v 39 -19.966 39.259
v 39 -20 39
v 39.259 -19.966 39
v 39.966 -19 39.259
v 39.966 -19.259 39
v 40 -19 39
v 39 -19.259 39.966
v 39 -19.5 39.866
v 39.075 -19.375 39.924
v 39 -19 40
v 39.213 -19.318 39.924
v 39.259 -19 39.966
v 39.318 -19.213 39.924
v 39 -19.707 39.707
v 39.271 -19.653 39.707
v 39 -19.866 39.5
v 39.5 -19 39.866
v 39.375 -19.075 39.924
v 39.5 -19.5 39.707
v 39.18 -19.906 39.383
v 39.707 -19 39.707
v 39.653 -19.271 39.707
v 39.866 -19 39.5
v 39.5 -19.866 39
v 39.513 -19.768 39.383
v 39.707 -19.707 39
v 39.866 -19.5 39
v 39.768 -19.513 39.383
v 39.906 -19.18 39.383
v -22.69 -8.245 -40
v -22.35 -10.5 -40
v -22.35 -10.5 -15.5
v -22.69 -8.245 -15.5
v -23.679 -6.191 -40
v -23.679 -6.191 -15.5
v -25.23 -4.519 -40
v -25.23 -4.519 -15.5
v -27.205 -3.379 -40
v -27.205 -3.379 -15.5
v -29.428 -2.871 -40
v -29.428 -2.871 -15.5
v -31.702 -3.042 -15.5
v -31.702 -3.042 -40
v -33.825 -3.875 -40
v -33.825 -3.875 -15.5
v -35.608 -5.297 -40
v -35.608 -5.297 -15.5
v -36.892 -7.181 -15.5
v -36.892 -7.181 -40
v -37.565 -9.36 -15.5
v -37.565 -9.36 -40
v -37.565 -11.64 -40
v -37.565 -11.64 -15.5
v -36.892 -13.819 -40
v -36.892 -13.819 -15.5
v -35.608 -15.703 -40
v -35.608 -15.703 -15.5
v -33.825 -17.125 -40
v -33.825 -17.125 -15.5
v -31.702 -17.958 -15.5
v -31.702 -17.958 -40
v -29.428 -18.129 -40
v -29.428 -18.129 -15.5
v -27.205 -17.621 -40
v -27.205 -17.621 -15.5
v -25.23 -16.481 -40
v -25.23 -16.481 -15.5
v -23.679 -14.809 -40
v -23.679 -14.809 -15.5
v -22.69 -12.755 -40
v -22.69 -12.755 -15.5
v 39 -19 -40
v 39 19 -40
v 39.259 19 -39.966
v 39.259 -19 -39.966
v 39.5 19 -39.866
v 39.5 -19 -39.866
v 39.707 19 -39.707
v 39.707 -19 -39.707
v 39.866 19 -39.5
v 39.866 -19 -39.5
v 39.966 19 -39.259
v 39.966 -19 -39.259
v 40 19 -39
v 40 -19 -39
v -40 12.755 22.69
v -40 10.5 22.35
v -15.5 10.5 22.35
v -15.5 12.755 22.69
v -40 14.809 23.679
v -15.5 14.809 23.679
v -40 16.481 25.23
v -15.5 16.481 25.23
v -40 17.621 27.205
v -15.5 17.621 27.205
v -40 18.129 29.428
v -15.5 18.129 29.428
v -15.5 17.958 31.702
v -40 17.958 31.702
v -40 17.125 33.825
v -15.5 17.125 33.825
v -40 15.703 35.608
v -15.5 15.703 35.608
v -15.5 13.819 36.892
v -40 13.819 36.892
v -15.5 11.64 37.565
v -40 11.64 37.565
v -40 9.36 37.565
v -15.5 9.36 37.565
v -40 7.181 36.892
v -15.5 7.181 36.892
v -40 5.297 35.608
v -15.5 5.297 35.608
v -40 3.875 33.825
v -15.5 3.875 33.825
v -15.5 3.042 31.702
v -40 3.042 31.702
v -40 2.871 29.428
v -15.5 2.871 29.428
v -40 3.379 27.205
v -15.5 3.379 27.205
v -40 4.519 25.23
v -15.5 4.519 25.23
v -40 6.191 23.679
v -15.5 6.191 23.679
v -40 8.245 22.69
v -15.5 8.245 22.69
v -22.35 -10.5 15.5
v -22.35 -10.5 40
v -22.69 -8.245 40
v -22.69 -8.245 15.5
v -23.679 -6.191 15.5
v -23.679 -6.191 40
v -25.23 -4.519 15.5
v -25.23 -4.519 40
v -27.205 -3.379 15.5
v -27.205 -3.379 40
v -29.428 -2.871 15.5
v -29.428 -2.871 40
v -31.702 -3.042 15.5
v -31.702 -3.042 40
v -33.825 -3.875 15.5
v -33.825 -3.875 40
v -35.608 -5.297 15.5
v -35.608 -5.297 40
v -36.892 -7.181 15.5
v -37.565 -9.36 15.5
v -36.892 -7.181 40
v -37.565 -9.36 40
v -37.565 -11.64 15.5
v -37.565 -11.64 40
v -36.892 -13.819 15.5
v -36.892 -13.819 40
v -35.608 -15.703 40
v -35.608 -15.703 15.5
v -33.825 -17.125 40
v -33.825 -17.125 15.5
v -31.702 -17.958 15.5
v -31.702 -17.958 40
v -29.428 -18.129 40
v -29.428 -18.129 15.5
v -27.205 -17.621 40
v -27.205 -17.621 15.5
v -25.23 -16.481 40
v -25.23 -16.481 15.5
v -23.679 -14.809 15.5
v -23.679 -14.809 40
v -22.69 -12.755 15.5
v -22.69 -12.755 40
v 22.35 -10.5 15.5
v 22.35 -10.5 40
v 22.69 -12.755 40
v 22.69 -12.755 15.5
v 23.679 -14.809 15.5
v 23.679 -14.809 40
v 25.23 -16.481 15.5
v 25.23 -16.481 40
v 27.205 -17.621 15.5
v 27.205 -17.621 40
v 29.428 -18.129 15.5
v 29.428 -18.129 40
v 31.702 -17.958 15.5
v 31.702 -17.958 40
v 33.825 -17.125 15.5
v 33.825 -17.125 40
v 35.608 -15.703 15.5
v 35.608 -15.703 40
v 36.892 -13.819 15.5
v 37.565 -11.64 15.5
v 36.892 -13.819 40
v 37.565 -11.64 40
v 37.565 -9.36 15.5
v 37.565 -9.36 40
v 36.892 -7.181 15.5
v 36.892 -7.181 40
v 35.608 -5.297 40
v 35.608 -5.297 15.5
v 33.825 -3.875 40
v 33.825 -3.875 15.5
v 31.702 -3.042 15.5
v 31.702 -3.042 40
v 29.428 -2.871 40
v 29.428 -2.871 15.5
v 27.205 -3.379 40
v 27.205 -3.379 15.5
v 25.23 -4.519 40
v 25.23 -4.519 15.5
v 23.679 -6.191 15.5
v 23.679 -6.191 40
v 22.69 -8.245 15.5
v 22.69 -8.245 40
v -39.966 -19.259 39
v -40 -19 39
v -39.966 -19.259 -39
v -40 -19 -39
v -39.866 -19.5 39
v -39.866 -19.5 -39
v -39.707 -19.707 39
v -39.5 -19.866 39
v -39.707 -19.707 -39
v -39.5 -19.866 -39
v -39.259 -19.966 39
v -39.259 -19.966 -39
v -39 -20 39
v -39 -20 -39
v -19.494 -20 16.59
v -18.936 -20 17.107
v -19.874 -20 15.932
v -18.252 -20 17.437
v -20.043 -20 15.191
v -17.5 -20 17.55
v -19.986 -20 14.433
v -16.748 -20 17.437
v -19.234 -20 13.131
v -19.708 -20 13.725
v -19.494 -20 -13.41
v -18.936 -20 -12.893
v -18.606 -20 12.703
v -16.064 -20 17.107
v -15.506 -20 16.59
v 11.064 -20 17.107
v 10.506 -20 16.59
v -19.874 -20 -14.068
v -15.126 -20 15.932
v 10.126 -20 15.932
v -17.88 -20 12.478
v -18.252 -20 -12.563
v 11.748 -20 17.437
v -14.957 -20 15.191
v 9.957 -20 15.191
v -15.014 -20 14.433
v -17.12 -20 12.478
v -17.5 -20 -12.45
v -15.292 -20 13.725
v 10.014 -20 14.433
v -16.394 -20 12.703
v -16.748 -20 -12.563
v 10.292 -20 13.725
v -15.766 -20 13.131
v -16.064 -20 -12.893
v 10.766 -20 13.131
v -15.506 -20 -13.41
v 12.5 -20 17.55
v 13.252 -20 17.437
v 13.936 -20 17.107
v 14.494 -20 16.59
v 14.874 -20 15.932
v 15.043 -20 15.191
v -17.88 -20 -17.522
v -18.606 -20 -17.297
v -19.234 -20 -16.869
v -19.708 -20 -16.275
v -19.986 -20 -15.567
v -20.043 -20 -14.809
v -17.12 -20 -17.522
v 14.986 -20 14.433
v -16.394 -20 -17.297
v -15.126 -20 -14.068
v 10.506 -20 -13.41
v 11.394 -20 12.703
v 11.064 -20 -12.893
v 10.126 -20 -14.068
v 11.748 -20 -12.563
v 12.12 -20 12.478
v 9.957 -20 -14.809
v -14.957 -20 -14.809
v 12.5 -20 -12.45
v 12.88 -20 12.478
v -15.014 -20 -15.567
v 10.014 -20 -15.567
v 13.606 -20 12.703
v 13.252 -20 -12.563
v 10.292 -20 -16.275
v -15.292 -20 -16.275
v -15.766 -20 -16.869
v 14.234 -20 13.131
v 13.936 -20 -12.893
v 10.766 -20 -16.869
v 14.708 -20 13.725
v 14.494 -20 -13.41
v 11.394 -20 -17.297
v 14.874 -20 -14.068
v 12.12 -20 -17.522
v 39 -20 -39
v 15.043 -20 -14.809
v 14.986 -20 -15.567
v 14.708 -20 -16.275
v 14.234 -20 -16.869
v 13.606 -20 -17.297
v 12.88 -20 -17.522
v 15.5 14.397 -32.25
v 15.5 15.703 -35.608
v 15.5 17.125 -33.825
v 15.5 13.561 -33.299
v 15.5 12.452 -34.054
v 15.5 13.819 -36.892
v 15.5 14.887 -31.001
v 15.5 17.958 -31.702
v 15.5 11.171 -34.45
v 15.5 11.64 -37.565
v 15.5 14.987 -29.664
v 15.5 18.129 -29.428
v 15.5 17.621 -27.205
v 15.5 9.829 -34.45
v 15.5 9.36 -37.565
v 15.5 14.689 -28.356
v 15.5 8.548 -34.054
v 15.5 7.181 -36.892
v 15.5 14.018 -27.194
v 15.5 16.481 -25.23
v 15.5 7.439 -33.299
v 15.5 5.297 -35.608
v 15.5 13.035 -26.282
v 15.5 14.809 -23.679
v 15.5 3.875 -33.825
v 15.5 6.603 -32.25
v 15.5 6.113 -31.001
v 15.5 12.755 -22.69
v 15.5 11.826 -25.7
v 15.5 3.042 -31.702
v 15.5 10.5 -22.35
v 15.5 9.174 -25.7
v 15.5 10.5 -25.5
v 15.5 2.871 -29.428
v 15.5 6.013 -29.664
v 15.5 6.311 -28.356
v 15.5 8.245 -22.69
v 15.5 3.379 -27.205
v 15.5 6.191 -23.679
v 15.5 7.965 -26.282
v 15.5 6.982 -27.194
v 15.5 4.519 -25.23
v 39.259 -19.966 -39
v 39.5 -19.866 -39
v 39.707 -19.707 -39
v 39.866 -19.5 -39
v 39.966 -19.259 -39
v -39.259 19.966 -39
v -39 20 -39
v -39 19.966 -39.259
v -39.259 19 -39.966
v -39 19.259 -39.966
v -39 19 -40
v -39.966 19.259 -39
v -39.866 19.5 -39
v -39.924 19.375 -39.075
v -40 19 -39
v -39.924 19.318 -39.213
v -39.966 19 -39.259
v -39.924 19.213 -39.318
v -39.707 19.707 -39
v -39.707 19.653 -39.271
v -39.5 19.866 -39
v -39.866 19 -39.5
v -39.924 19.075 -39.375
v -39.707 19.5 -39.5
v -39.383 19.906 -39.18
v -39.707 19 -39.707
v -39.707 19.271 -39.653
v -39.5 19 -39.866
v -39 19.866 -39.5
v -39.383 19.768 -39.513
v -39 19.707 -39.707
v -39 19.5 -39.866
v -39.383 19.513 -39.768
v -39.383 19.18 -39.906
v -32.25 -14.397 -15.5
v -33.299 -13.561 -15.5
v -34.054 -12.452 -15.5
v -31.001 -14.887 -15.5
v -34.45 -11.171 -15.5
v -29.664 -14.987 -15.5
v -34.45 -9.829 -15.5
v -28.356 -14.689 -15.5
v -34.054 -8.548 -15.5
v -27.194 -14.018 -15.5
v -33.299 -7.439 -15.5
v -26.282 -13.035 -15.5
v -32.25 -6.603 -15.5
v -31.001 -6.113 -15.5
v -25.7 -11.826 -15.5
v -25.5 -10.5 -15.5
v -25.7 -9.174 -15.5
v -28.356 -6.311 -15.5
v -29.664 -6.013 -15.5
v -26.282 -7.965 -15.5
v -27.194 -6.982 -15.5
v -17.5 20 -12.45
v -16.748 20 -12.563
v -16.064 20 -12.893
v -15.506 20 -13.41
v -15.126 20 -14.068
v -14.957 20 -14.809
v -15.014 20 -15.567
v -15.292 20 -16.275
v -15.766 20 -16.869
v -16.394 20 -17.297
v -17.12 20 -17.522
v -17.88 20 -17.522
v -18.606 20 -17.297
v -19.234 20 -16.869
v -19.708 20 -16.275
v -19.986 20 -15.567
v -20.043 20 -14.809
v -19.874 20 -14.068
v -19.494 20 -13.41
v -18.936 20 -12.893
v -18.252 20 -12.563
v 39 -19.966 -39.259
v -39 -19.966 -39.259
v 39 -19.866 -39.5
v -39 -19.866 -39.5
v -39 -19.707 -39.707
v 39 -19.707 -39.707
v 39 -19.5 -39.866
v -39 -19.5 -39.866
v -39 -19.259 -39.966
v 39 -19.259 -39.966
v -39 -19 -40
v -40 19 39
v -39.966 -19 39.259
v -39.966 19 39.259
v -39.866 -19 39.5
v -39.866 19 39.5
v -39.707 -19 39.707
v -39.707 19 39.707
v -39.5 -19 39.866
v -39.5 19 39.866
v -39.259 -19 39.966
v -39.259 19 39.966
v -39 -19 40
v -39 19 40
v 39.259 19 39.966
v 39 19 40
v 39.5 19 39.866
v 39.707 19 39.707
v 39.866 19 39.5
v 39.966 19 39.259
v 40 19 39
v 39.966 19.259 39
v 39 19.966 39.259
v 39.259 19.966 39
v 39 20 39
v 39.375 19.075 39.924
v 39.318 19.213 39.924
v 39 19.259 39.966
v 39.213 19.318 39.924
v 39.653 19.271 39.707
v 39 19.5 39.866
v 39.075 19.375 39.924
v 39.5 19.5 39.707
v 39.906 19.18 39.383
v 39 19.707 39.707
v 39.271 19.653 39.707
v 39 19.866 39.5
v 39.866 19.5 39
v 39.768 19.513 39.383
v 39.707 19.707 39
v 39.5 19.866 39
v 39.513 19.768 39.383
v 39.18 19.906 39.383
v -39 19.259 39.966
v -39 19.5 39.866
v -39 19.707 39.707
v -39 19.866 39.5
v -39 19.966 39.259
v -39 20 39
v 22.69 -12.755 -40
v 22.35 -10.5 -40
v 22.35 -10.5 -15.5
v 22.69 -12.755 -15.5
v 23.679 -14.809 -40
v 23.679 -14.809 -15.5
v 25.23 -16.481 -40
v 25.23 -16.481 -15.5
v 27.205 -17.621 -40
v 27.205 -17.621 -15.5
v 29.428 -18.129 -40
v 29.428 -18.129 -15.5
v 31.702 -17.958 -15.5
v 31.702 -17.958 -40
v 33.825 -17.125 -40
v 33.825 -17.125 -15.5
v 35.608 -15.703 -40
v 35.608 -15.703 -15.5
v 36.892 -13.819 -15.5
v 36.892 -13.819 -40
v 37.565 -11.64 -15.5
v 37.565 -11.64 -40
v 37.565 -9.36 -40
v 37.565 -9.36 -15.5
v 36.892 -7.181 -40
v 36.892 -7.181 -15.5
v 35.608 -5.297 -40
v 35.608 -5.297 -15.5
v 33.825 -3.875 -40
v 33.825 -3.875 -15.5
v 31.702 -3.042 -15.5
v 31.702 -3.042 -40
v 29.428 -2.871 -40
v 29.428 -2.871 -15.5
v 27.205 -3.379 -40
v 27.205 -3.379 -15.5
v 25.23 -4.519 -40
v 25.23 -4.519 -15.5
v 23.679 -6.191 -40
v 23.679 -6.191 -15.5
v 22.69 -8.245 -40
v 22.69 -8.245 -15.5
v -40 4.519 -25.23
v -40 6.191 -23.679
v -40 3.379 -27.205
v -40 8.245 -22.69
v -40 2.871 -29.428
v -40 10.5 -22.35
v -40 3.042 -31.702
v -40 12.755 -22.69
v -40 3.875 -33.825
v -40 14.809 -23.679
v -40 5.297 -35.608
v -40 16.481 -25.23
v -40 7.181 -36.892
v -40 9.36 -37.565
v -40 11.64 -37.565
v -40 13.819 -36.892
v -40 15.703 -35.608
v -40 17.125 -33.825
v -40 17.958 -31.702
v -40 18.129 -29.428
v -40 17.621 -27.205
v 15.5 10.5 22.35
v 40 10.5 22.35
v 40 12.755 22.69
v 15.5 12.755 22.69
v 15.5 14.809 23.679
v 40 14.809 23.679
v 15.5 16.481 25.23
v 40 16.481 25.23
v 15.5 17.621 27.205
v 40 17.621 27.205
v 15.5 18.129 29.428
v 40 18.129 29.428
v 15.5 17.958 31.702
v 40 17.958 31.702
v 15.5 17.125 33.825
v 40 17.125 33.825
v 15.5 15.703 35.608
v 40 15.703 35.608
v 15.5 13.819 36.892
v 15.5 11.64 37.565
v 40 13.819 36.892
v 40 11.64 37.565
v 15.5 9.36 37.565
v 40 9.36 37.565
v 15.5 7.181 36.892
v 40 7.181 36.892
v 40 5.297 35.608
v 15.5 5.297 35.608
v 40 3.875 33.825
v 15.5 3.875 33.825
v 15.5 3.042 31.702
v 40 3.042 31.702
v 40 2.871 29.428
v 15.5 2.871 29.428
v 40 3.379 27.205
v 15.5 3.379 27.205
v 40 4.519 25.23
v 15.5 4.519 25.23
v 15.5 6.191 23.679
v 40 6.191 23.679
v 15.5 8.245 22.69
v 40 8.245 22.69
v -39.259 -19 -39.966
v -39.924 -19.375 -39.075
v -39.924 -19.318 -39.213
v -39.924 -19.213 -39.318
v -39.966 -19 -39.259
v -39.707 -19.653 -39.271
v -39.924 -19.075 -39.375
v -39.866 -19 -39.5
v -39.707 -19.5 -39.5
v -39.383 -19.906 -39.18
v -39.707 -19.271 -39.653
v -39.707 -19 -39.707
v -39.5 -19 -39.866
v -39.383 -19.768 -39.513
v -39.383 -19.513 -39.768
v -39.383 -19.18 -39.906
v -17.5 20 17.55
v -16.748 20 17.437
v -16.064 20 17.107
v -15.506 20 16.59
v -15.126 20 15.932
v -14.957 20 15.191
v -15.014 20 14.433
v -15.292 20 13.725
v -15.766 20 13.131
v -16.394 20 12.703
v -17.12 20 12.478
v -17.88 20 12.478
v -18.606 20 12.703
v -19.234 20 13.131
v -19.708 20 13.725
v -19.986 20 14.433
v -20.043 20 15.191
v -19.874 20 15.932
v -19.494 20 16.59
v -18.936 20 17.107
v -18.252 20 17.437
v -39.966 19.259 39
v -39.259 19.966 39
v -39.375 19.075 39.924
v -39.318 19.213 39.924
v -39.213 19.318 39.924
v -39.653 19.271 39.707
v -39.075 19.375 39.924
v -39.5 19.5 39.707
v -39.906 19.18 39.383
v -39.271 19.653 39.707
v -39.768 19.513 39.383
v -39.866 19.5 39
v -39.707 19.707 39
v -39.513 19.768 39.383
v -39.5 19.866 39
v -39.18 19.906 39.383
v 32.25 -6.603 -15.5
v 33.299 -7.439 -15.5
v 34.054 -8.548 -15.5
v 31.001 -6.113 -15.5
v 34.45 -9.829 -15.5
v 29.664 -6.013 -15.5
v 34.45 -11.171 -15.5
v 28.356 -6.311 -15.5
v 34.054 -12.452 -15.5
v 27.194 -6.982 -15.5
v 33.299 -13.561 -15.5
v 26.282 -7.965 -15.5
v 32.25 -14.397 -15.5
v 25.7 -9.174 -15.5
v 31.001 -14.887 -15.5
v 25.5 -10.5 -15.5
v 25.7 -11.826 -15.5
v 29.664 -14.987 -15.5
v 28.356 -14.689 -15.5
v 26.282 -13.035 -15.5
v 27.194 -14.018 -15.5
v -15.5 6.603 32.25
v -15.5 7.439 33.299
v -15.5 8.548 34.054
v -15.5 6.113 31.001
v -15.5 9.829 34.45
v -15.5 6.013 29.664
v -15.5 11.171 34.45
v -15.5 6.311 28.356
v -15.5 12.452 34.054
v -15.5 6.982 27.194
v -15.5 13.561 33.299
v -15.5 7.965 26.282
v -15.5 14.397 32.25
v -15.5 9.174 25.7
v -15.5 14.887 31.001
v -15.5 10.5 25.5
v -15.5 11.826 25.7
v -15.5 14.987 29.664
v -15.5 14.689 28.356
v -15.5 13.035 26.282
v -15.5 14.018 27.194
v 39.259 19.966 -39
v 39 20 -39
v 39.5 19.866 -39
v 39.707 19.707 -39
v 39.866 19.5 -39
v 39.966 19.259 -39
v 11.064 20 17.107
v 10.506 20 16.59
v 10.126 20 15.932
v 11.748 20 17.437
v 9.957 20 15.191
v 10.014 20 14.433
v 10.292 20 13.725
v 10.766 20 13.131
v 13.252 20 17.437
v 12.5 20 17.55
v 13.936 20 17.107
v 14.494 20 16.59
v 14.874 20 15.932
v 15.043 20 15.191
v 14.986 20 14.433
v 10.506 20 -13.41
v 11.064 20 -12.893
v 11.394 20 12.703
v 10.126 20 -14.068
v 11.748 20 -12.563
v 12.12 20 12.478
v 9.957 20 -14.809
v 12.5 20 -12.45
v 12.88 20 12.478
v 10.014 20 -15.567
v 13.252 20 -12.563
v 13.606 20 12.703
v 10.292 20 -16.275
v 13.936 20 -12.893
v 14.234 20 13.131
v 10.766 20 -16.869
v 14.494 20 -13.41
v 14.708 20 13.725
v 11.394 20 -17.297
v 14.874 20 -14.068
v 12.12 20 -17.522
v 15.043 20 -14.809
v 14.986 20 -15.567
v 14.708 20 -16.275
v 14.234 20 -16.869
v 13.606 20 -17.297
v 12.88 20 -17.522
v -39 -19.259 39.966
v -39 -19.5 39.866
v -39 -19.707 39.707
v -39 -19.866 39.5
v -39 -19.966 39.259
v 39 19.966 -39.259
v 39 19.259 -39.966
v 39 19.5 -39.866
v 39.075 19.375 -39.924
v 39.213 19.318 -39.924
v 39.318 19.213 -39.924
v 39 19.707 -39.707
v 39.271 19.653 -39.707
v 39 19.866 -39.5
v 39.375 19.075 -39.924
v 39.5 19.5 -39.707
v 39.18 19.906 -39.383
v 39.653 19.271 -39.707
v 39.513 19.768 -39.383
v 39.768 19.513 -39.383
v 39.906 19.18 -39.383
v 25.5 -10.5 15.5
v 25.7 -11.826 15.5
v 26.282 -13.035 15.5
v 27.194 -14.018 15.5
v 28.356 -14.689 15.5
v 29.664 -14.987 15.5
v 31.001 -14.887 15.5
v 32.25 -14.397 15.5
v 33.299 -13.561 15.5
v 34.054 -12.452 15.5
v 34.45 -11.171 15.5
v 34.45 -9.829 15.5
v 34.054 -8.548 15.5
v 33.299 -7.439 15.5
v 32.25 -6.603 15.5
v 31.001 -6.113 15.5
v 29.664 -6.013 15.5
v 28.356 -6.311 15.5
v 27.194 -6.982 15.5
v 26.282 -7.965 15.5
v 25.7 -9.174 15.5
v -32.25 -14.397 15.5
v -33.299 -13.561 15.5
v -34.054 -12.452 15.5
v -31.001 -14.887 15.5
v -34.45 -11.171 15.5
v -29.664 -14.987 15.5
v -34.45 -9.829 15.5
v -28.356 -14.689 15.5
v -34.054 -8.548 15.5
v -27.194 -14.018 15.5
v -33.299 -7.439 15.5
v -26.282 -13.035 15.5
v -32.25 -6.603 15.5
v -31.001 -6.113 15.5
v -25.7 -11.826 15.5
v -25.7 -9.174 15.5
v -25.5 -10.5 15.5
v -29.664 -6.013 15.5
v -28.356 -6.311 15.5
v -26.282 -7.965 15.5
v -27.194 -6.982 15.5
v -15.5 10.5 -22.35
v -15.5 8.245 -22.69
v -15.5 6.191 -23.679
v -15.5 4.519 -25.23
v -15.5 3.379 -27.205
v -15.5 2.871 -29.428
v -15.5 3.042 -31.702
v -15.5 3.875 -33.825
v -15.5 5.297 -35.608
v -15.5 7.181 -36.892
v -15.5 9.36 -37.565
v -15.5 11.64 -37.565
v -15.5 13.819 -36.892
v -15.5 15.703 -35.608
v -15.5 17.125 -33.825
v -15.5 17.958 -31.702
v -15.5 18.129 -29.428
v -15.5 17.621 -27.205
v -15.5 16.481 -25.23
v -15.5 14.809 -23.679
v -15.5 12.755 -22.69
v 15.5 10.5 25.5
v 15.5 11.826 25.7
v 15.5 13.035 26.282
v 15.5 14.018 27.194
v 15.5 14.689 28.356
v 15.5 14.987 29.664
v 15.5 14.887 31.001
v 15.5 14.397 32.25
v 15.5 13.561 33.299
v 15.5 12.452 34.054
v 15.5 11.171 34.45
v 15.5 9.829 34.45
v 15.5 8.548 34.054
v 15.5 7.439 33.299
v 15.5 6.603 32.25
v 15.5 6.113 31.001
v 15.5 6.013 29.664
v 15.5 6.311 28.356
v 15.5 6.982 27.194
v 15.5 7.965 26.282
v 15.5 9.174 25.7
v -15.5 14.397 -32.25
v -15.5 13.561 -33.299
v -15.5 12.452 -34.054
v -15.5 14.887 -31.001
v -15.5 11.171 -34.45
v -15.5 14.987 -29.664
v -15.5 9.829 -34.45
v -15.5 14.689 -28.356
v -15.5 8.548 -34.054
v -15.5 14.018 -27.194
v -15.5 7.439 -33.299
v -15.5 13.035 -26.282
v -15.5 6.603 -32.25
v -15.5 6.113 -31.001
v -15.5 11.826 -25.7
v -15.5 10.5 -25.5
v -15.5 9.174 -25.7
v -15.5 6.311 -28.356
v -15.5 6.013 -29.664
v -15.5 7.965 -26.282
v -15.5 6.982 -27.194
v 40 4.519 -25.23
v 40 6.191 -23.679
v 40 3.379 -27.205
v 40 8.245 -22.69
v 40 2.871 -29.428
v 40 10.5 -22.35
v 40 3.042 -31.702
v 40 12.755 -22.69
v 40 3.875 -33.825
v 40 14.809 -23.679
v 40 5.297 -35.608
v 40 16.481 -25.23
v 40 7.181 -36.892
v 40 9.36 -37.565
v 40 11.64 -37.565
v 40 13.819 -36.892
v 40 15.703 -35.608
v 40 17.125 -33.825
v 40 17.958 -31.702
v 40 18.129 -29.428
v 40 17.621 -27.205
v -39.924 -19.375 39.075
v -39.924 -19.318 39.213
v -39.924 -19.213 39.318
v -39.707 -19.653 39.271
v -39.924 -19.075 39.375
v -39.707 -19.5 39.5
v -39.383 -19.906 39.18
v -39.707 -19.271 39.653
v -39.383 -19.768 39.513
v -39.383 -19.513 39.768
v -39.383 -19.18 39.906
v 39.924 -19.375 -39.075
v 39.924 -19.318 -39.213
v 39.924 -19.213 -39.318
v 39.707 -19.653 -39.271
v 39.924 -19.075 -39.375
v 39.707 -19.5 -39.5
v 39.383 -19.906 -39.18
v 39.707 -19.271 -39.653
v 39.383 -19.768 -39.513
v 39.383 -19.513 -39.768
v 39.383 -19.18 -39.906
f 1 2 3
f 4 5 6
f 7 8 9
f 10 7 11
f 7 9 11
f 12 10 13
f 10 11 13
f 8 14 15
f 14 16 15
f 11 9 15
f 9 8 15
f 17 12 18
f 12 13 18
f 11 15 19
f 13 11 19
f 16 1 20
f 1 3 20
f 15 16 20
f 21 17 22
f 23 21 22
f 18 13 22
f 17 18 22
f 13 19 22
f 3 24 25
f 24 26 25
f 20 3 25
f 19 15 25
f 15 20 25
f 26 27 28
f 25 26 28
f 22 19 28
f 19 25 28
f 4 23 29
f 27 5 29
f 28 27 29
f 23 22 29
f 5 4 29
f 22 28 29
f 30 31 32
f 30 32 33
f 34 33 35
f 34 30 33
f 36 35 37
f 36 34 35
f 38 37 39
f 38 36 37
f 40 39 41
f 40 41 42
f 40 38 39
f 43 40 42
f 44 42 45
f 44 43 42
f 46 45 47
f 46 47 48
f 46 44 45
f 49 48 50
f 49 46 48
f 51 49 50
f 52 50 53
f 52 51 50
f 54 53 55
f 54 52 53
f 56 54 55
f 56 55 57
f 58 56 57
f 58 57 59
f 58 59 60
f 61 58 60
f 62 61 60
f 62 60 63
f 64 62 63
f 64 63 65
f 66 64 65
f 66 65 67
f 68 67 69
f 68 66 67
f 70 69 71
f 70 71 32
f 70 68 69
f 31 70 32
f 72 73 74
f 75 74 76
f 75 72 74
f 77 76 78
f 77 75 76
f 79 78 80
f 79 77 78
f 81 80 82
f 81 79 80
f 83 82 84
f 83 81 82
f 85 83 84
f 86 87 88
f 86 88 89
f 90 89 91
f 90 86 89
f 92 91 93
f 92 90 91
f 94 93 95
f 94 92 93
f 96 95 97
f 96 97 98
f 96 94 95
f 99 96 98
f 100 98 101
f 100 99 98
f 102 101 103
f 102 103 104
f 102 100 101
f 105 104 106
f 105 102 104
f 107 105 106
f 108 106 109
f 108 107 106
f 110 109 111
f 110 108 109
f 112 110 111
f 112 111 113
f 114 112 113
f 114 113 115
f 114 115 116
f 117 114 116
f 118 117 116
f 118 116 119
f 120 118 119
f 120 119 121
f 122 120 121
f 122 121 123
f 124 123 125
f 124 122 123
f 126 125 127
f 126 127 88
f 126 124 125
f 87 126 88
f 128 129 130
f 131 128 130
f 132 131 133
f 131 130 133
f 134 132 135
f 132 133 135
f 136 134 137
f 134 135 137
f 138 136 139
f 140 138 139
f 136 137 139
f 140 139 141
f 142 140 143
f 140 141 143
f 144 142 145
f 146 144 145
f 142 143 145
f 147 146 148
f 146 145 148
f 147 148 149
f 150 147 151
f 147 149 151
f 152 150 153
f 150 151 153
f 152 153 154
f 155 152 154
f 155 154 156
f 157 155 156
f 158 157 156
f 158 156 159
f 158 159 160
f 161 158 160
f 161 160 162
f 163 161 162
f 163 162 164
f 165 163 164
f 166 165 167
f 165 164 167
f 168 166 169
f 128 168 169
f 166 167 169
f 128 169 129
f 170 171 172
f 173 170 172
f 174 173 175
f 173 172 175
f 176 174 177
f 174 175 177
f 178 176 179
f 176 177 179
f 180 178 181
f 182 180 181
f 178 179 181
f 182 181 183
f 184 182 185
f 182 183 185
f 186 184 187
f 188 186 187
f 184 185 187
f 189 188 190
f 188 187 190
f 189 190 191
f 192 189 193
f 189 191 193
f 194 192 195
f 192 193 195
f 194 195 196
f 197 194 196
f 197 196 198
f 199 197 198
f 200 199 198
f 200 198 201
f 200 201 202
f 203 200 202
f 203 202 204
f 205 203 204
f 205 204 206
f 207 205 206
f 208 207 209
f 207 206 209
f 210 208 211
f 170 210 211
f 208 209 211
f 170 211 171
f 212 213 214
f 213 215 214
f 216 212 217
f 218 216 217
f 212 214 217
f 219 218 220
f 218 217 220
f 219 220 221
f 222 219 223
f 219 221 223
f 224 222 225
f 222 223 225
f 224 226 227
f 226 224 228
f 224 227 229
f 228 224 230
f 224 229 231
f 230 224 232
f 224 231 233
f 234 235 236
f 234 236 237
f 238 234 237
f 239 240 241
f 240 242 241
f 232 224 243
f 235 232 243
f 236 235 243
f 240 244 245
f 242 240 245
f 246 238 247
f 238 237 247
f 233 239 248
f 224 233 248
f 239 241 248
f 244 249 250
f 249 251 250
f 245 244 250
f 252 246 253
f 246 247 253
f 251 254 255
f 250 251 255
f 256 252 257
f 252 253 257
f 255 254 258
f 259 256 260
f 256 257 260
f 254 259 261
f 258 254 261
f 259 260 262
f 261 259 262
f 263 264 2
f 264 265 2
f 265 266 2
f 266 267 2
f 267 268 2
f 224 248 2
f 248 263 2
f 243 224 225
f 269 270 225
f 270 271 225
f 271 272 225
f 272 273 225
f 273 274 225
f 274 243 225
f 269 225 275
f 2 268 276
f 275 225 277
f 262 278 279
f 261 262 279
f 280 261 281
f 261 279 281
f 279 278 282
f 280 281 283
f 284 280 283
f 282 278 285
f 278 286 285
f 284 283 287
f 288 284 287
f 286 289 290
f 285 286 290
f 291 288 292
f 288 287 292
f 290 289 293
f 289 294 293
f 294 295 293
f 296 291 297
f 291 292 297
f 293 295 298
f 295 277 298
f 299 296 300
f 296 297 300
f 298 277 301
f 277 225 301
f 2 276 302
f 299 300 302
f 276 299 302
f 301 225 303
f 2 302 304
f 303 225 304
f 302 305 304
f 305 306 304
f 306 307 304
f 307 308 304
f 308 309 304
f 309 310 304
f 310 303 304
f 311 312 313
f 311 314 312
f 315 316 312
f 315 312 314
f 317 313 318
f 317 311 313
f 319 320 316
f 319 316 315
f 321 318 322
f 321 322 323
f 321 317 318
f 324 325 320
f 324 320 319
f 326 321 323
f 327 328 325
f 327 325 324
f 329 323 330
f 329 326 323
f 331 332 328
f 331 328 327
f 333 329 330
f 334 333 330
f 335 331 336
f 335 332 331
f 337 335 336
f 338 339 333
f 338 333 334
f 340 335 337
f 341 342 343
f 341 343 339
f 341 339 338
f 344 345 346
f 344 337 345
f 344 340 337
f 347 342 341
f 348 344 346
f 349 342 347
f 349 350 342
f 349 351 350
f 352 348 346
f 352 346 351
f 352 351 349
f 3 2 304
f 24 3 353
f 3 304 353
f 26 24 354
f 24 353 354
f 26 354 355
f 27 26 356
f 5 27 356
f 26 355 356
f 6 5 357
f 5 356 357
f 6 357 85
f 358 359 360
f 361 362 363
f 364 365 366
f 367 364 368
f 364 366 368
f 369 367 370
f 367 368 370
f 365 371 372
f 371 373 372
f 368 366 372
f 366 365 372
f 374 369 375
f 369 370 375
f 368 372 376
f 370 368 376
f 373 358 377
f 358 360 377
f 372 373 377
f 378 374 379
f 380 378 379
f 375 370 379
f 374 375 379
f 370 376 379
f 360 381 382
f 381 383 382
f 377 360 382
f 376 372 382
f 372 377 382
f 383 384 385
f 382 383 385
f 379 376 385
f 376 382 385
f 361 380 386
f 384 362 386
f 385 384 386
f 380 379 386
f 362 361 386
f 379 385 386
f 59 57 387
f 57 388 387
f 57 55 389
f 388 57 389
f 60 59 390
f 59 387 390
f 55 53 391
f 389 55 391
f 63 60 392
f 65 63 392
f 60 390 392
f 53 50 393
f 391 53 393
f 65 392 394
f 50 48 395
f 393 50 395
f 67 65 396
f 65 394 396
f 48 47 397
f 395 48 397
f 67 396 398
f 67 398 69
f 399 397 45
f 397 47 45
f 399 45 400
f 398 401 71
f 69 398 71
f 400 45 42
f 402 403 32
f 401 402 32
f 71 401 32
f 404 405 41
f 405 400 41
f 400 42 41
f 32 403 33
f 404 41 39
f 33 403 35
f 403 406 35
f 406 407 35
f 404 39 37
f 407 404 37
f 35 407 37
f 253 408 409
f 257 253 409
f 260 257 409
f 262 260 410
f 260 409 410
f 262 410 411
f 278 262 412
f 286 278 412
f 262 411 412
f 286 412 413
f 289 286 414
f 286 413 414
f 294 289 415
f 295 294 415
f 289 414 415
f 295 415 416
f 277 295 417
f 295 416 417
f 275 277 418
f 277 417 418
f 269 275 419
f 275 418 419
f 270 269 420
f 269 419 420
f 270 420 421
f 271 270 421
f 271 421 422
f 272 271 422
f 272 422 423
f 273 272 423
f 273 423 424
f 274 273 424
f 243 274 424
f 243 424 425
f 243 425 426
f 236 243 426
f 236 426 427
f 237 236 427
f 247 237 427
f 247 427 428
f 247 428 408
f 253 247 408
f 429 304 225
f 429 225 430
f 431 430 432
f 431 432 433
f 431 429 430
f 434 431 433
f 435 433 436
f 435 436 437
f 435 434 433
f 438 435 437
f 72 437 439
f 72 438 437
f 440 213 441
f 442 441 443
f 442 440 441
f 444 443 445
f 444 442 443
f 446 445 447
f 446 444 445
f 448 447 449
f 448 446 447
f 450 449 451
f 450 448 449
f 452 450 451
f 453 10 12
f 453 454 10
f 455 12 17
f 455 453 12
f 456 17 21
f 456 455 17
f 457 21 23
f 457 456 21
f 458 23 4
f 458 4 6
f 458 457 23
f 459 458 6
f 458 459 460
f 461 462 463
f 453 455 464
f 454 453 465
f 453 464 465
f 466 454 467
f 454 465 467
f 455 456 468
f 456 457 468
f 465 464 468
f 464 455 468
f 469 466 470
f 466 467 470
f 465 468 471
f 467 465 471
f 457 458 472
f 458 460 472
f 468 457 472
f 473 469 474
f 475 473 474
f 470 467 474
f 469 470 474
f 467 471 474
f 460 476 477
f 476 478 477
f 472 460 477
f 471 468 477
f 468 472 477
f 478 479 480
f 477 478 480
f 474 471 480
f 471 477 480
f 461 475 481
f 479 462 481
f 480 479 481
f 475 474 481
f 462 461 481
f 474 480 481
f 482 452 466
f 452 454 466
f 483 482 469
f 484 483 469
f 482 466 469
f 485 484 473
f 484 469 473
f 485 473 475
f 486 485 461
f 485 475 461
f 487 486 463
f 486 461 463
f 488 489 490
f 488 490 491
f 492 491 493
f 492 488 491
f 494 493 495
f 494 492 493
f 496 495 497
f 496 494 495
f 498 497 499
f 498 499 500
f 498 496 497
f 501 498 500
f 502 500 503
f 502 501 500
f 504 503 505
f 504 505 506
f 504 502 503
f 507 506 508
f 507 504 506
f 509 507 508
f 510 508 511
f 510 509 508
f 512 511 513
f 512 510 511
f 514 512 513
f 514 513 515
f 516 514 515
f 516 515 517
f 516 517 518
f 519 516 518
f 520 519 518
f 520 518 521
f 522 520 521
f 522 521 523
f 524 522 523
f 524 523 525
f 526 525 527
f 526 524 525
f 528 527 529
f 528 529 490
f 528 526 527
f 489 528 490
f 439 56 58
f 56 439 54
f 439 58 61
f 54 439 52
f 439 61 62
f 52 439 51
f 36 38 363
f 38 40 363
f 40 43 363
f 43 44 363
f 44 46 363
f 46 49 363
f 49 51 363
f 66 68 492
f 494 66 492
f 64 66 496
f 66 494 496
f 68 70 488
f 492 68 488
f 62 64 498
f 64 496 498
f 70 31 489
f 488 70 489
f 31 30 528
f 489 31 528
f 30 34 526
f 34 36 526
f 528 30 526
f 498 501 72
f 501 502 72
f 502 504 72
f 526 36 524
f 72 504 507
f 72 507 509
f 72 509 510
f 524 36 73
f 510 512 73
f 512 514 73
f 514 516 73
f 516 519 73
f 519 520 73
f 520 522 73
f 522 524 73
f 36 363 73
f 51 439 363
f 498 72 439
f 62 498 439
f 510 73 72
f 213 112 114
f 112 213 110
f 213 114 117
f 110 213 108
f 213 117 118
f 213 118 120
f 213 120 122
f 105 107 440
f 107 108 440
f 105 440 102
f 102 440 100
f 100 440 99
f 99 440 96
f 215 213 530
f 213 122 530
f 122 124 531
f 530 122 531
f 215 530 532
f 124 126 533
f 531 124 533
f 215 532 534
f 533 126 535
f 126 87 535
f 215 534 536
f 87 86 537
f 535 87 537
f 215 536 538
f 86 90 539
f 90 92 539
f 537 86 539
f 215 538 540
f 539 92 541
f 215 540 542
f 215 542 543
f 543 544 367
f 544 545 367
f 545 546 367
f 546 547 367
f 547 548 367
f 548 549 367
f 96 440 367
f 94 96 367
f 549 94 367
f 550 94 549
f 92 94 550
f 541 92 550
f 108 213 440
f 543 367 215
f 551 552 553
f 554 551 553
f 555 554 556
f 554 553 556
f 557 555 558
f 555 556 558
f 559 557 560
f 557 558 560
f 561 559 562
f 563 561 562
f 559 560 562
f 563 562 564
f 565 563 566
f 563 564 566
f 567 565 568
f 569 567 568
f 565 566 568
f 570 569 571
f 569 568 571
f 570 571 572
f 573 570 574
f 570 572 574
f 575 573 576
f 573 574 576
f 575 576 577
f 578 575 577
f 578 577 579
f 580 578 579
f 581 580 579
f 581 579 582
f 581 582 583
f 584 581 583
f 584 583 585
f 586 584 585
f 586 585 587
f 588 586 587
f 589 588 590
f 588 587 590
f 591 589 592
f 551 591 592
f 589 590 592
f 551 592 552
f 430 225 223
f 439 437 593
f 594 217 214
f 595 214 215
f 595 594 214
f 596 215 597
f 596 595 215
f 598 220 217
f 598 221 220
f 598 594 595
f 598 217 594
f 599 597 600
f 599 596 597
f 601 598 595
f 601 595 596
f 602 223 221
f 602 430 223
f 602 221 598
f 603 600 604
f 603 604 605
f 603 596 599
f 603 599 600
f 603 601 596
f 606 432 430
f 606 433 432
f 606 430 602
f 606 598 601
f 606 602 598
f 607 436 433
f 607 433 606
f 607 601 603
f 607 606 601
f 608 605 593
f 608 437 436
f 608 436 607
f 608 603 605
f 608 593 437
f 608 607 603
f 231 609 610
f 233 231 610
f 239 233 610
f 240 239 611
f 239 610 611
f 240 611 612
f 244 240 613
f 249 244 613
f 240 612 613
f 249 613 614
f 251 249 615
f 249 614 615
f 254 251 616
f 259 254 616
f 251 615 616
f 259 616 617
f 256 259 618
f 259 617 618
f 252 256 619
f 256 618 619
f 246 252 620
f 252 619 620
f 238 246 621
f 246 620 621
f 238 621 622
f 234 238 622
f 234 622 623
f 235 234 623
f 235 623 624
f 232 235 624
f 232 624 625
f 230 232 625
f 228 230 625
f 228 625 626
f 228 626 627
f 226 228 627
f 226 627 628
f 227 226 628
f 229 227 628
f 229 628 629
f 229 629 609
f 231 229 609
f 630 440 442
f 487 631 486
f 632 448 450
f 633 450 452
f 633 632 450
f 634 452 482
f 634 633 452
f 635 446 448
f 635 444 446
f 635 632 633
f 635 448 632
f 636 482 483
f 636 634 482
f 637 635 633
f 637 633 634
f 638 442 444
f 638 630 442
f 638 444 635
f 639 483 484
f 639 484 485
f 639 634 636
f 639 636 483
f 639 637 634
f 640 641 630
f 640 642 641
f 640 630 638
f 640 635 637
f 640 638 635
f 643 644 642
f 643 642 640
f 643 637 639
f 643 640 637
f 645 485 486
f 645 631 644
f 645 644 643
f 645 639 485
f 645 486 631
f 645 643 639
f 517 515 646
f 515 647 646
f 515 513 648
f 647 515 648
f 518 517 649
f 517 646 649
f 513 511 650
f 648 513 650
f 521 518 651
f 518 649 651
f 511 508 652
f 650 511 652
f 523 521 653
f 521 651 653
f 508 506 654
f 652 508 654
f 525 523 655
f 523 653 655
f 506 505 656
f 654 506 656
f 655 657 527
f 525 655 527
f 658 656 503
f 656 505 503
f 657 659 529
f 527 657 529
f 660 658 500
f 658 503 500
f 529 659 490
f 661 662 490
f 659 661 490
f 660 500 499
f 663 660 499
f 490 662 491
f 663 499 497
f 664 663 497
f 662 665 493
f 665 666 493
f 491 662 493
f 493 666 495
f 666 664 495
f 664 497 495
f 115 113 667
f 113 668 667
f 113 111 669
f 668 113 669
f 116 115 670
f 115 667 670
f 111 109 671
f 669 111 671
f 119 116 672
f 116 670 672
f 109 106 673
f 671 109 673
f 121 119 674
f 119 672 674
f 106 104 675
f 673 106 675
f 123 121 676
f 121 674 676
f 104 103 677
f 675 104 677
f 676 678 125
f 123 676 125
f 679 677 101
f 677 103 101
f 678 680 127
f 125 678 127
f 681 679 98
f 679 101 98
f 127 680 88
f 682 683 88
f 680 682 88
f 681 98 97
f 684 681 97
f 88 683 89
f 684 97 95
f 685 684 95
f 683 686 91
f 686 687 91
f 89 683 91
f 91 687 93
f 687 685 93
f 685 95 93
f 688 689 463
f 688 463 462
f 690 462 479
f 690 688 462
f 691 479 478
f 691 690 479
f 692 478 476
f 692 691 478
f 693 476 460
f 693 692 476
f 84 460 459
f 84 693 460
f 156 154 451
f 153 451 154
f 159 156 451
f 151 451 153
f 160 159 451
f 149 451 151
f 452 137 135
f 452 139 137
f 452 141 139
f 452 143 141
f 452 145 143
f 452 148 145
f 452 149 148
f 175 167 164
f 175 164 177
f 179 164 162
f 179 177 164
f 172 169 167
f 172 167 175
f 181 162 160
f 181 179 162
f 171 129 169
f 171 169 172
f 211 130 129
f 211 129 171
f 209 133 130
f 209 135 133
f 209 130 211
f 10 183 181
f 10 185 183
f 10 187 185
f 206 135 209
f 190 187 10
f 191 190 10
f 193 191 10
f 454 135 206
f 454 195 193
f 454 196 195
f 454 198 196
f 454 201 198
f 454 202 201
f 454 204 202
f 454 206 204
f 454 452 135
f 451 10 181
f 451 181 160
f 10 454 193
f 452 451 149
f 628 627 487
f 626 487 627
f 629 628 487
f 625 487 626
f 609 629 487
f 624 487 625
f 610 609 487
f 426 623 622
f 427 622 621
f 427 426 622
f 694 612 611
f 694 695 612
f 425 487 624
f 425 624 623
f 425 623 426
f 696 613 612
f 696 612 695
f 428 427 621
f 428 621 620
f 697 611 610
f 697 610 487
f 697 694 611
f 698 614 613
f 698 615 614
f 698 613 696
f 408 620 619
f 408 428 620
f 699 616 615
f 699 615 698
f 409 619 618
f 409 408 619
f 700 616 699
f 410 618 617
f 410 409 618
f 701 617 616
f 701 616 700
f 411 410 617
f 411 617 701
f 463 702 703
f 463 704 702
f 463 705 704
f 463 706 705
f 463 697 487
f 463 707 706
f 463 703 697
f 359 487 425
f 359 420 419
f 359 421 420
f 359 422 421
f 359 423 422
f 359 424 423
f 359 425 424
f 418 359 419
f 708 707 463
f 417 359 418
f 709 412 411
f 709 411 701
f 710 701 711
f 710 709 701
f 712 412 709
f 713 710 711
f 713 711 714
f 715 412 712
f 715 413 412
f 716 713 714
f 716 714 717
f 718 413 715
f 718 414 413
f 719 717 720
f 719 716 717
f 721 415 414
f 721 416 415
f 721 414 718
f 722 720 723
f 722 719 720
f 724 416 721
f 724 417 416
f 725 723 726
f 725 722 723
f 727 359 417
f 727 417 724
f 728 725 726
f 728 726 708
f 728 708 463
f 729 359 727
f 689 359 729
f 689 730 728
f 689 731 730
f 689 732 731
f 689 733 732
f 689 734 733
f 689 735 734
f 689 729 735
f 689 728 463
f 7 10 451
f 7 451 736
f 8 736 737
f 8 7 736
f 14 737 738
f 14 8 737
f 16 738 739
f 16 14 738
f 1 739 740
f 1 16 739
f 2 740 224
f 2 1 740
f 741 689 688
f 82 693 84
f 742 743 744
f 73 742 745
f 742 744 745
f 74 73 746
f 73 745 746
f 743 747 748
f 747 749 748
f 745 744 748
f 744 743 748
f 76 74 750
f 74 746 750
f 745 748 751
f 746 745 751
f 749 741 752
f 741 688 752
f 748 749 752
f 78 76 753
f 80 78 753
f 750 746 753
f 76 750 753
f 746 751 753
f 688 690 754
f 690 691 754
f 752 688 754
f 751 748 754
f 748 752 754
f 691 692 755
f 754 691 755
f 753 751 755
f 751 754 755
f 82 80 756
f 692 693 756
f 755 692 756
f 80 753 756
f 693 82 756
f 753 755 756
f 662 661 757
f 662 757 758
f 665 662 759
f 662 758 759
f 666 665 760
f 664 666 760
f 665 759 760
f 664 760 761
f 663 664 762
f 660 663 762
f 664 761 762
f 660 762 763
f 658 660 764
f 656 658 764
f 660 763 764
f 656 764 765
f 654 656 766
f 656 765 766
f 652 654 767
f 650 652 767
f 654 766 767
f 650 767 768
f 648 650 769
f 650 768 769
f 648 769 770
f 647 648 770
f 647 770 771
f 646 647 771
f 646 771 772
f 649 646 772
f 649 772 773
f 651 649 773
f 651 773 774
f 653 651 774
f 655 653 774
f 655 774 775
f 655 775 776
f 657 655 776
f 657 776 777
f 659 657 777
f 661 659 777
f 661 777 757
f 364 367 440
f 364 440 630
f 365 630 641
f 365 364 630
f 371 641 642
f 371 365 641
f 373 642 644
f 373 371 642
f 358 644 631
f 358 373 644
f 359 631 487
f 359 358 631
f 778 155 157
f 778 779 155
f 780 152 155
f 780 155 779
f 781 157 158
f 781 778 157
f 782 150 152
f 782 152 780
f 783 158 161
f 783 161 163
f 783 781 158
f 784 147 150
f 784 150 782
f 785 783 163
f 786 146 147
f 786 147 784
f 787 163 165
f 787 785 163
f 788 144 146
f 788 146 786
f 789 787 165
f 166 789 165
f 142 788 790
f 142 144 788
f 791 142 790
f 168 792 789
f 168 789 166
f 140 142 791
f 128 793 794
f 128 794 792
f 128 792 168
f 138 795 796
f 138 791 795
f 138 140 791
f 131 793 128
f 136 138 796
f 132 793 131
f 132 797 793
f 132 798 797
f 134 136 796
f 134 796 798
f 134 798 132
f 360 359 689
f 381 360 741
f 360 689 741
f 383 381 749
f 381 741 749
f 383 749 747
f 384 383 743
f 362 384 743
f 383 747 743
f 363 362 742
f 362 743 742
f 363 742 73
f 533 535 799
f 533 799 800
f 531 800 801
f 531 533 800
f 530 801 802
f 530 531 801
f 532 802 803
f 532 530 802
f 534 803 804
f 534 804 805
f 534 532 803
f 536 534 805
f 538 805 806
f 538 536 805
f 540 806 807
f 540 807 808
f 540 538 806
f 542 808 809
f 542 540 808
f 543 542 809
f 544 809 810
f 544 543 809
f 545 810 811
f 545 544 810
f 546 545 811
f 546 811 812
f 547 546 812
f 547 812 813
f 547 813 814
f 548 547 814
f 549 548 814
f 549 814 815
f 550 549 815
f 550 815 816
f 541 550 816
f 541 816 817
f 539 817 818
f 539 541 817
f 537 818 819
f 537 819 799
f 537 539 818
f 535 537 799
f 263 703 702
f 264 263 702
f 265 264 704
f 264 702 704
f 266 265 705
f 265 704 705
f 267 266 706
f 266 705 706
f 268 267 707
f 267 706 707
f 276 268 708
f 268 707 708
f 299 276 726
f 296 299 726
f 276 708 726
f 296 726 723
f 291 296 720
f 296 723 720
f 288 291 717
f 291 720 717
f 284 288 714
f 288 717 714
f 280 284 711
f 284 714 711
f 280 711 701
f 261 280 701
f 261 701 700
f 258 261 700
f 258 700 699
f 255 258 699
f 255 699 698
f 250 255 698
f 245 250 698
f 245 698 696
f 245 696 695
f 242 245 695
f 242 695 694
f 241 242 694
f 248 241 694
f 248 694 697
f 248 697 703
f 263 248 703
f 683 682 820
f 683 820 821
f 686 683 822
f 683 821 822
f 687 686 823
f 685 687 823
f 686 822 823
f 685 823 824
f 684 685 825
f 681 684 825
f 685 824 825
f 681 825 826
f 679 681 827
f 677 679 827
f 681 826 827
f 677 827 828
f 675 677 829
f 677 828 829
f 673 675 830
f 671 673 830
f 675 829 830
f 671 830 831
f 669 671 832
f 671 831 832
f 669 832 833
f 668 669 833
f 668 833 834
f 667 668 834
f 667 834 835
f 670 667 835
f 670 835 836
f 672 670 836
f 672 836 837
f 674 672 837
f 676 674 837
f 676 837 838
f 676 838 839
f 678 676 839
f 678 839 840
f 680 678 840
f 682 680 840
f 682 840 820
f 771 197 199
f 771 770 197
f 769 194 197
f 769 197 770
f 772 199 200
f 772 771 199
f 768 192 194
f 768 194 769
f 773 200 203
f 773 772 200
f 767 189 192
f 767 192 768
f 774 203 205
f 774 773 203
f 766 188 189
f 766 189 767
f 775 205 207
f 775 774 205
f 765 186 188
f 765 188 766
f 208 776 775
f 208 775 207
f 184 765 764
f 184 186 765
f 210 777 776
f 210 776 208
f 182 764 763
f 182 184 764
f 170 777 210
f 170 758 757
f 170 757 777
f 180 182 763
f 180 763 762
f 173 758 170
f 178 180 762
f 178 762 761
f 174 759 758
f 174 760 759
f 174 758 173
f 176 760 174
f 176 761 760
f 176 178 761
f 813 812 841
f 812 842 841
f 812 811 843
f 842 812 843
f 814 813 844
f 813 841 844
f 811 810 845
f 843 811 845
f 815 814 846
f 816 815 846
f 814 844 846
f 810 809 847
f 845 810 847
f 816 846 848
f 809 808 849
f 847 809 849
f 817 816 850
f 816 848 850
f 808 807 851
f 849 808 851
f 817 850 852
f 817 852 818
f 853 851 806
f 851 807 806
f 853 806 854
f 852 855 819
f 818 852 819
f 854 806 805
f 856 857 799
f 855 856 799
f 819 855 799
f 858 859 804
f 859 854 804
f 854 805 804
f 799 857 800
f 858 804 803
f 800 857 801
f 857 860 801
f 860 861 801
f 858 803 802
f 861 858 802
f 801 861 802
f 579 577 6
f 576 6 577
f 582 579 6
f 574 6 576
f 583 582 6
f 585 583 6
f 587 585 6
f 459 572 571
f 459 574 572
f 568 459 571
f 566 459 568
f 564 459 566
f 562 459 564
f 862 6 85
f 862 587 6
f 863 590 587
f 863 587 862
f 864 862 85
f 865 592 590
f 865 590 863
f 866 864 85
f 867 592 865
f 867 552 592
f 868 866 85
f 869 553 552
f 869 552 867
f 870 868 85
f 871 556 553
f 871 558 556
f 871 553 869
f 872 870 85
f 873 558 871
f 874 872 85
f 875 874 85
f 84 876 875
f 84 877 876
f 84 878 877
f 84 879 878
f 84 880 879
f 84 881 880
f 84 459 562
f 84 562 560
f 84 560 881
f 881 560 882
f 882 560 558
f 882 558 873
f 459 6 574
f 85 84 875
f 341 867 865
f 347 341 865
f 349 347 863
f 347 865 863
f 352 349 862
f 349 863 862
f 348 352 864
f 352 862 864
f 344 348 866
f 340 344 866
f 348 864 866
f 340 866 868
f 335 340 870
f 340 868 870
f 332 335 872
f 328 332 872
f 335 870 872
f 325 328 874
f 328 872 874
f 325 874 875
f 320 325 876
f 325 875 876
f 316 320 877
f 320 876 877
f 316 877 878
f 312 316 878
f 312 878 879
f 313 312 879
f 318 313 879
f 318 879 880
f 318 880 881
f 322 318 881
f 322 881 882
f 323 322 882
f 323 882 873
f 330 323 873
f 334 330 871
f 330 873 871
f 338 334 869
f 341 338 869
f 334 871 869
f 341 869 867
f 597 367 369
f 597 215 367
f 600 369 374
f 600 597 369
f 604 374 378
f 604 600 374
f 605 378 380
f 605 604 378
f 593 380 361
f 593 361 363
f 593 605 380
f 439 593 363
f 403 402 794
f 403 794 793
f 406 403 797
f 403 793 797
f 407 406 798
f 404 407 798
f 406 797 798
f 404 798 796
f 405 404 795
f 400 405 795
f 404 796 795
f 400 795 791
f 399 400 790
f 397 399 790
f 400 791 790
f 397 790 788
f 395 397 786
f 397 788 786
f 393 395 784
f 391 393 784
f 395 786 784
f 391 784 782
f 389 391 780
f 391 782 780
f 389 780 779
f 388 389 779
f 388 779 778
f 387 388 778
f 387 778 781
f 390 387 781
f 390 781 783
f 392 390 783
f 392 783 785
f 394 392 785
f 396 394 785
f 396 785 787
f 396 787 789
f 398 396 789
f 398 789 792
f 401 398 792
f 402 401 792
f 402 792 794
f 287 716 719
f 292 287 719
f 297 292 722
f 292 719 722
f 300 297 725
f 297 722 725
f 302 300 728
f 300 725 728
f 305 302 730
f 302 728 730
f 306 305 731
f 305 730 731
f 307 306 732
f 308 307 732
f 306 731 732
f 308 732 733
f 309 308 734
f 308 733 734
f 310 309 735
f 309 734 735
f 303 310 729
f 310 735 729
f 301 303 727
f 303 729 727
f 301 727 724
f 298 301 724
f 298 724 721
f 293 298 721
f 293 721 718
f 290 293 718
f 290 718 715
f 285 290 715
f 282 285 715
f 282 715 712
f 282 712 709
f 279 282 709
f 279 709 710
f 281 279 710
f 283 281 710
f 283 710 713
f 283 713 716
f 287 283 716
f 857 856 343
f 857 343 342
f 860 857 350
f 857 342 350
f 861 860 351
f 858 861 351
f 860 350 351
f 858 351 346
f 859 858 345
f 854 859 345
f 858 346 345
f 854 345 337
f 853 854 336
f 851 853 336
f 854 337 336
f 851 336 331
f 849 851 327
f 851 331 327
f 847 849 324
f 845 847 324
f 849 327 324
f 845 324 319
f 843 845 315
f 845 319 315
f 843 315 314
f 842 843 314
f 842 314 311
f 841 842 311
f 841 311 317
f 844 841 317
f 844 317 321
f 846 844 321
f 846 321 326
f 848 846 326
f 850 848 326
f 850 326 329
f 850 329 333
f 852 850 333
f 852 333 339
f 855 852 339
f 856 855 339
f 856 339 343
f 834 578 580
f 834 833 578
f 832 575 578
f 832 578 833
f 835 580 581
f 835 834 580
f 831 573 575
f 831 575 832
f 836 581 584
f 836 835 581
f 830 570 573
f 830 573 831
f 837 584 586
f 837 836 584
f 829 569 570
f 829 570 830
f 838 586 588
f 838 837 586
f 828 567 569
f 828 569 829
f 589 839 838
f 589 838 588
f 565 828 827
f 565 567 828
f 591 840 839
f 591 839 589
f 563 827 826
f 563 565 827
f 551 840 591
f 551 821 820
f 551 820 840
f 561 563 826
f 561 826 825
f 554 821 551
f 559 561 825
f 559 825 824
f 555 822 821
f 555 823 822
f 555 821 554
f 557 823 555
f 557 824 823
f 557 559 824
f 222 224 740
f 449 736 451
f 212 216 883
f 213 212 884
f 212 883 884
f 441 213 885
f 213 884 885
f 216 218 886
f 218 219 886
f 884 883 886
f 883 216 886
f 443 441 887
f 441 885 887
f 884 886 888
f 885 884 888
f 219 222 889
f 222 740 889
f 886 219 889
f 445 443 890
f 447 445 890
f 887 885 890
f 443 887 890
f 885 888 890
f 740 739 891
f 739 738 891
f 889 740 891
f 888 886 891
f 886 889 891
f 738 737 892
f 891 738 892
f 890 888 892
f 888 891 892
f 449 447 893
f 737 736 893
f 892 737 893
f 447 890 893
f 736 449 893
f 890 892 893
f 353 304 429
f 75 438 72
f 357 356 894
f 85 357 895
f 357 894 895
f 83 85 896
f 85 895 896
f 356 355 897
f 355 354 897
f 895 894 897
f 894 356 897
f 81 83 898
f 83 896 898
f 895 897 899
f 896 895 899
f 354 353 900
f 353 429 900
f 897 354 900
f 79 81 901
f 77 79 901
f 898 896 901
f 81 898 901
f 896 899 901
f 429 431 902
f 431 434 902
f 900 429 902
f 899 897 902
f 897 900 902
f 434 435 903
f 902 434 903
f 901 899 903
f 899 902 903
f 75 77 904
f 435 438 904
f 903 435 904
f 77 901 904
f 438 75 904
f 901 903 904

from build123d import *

# Parameters (mm, degrees)
SKETCH1_W           = 80
SKETCH1_H           = 80
BOSS_EXTRUDE1_DEPTH = 20
SKETCH3_R           = 4.5
CUT_EXTRUDE2_DEPTH  = 92.651513899
SKETCH3_4_R         = 7.65
SKETCH3_4_R_2       = 4.5
CUT_EXTRUDE3_DEPTH  = 24.5
SKETCH7_R           = 4.5
CUT_EXTRUDE4_DEPTH  = 92.651513899
SKETCH7_4_R         = 7.65
SKETCH7_4_R_2       = 4.5
CUT_EXTRUDE5_DEPTH  = 24.5
FILLET1_R           = 1
SKETCH8_R           = 2.55
CUT_EXTRUDE7_DEPTH  = 70.282032303


with BuildPart() as part:
    # Sketch1 → Boss-Extrude1 (new, symmetric)
    with BuildSketch(Plane(origin=(0, 0, 0), x_dir=(1, 0, 0), z_dir=(0, 1, 0))):
        Rectangle(SKETCH1_W, SKETCH1_H)
    extrude(amount=BOSS_EXTRUDE1_DEPTH, both=True)

    # Sketch3 → Cut-Extrude2 (cut, through all)
    with BuildSketch(Plane.XY.offset(40)):
        with Locations((-30, -10.5)):
            Circle(SKETCH3_R)
        with Locations((30, -10.5)):
            Circle(SKETCH3_R)
    extrude(amount=-CUT_EXTRUDE2_DEPTH, mode=Mode.SUBTRACT)

    # Sketch3<4> → Cut-Extrude3 (cut)
    # profile 1 of 2: a face of its own
    with BuildSketch(Plane.XY.offset(40)):
        with Locations((-30, -10.5)):
            Circle(SKETCH3_4_R)
        with Locations((-30, -10.5)):
            Circle(SKETCH3_4_R_2, mode=Mode.SUBTRACT)
    # profile 2 of 2: a face of its own
    with BuildSketch(Plane.XY.offset(40)):
        with Locations((30, -10.5)):
            Circle(SKETCH3_4_R)
        with Locations((30, -10.5)):
            Circle(SKETCH3_4_R_2, mode=Mode.SUBTRACT)
    cut_extrude3 = extrude(amount=-CUT_EXTRUDE3_DEPTH, mode=Mode.SUBTRACT)

    # Mirror1: Cut-Extrude3 across plane
    add(cut_extrude3.mirror(Plane.XY), mode=Mode.SUBTRACT)

    # Sketch7 → Cut-Extrude4 (cut, through all)
    with BuildSketch(Plane(origin=(40, 0, 0), x_dir=(0, 0, -1), z_dir=(1, 0, 0))):
        with Locations((-30, 10.5)):
            Circle(SKETCH7_R)
        with Locations((30, 10.5)):
            Circle(SKETCH7_R)
    extrude(amount=-CUT_EXTRUDE4_DEPTH, mode=Mode.SUBTRACT)

    # Sketch7<4> → Cut-Extrude5 (cut)
    # profile 1 of 2: a face of its own
    with BuildSketch(Plane(origin=(40, 0, 0), x_dir=(0, 0, -1), z_dir=(1, 0, 0))):
        with Locations((-30, 10.5)):
            Circle(SKETCH7_4_R)
        with Locations((-30, 10.5)):
            Circle(SKETCH7_4_R_2, mode=Mode.SUBTRACT)
    # profile 2 of 2: a face of its own
    with BuildSketch(Plane(origin=(40, 0, 0), x_dir=(0, 0, -1), z_dir=(1, 0, 0))):
        with Locations((30, 10.5)):
            Circle(SKETCH7_4_R)
        with Locations((30, 10.5)):
            Circle(SKETCH7_4_R_2, mode=Mode.SUBTRACT)
    cut_extrude5 = extrude(amount=-CUT_EXTRUDE5_DEPTH, mode=Mode.SUBTRACT)

    # Mirror2: Cut-Extrude5 across plane
    add(cut_extrude5.mirror(Plane(origin=(0, 0, 0), x_dir=(0, 0, 1), z_dir=(1, 0, 0))), mode=Mode.SUBTRACT)

    # Fillet1
    fillet1_edges = [part.edges().sort_by_distance(p)[0] for p in [
        (0, -20, 40),
        (0, 20, 40),
        (-40, 0, 40),
        (-40, -20, 0),
        (-40, 20, 0),
        (-40, 0, -40),
        (0, -20, -40),
        (0, 20, -40),
        (40, 20, 0),
        (40, 0, -40),
        (40, -20, 0),
        (40, 0, 40),
    ]]
    fillet(fillet1_edges, radius=FILLET1_R)

    # Sketch8 → Cut-Extrude7 (cut, through all)
    with BuildSketch(Plane(origin=(0, 20, 0), x_dir=(1, 0, 0), z_dir=(0, 1, 0))):
        with Locations((-17.5, 15)):
            Circle(SKETCH8_R)
        with Locations((12.5, 15)):
            Circle(SKETCH8_R)
        with Locations((12.5, -15)):
            Circle(SKETCH8_R)
        with Locations((-17.5, -15)):
            Circle(SKETCH8_R)
    extrude(amount=-CUT_EXTRUDE7_DEPTH, mode=Mode.SUBTRACT)


solid = part.part
